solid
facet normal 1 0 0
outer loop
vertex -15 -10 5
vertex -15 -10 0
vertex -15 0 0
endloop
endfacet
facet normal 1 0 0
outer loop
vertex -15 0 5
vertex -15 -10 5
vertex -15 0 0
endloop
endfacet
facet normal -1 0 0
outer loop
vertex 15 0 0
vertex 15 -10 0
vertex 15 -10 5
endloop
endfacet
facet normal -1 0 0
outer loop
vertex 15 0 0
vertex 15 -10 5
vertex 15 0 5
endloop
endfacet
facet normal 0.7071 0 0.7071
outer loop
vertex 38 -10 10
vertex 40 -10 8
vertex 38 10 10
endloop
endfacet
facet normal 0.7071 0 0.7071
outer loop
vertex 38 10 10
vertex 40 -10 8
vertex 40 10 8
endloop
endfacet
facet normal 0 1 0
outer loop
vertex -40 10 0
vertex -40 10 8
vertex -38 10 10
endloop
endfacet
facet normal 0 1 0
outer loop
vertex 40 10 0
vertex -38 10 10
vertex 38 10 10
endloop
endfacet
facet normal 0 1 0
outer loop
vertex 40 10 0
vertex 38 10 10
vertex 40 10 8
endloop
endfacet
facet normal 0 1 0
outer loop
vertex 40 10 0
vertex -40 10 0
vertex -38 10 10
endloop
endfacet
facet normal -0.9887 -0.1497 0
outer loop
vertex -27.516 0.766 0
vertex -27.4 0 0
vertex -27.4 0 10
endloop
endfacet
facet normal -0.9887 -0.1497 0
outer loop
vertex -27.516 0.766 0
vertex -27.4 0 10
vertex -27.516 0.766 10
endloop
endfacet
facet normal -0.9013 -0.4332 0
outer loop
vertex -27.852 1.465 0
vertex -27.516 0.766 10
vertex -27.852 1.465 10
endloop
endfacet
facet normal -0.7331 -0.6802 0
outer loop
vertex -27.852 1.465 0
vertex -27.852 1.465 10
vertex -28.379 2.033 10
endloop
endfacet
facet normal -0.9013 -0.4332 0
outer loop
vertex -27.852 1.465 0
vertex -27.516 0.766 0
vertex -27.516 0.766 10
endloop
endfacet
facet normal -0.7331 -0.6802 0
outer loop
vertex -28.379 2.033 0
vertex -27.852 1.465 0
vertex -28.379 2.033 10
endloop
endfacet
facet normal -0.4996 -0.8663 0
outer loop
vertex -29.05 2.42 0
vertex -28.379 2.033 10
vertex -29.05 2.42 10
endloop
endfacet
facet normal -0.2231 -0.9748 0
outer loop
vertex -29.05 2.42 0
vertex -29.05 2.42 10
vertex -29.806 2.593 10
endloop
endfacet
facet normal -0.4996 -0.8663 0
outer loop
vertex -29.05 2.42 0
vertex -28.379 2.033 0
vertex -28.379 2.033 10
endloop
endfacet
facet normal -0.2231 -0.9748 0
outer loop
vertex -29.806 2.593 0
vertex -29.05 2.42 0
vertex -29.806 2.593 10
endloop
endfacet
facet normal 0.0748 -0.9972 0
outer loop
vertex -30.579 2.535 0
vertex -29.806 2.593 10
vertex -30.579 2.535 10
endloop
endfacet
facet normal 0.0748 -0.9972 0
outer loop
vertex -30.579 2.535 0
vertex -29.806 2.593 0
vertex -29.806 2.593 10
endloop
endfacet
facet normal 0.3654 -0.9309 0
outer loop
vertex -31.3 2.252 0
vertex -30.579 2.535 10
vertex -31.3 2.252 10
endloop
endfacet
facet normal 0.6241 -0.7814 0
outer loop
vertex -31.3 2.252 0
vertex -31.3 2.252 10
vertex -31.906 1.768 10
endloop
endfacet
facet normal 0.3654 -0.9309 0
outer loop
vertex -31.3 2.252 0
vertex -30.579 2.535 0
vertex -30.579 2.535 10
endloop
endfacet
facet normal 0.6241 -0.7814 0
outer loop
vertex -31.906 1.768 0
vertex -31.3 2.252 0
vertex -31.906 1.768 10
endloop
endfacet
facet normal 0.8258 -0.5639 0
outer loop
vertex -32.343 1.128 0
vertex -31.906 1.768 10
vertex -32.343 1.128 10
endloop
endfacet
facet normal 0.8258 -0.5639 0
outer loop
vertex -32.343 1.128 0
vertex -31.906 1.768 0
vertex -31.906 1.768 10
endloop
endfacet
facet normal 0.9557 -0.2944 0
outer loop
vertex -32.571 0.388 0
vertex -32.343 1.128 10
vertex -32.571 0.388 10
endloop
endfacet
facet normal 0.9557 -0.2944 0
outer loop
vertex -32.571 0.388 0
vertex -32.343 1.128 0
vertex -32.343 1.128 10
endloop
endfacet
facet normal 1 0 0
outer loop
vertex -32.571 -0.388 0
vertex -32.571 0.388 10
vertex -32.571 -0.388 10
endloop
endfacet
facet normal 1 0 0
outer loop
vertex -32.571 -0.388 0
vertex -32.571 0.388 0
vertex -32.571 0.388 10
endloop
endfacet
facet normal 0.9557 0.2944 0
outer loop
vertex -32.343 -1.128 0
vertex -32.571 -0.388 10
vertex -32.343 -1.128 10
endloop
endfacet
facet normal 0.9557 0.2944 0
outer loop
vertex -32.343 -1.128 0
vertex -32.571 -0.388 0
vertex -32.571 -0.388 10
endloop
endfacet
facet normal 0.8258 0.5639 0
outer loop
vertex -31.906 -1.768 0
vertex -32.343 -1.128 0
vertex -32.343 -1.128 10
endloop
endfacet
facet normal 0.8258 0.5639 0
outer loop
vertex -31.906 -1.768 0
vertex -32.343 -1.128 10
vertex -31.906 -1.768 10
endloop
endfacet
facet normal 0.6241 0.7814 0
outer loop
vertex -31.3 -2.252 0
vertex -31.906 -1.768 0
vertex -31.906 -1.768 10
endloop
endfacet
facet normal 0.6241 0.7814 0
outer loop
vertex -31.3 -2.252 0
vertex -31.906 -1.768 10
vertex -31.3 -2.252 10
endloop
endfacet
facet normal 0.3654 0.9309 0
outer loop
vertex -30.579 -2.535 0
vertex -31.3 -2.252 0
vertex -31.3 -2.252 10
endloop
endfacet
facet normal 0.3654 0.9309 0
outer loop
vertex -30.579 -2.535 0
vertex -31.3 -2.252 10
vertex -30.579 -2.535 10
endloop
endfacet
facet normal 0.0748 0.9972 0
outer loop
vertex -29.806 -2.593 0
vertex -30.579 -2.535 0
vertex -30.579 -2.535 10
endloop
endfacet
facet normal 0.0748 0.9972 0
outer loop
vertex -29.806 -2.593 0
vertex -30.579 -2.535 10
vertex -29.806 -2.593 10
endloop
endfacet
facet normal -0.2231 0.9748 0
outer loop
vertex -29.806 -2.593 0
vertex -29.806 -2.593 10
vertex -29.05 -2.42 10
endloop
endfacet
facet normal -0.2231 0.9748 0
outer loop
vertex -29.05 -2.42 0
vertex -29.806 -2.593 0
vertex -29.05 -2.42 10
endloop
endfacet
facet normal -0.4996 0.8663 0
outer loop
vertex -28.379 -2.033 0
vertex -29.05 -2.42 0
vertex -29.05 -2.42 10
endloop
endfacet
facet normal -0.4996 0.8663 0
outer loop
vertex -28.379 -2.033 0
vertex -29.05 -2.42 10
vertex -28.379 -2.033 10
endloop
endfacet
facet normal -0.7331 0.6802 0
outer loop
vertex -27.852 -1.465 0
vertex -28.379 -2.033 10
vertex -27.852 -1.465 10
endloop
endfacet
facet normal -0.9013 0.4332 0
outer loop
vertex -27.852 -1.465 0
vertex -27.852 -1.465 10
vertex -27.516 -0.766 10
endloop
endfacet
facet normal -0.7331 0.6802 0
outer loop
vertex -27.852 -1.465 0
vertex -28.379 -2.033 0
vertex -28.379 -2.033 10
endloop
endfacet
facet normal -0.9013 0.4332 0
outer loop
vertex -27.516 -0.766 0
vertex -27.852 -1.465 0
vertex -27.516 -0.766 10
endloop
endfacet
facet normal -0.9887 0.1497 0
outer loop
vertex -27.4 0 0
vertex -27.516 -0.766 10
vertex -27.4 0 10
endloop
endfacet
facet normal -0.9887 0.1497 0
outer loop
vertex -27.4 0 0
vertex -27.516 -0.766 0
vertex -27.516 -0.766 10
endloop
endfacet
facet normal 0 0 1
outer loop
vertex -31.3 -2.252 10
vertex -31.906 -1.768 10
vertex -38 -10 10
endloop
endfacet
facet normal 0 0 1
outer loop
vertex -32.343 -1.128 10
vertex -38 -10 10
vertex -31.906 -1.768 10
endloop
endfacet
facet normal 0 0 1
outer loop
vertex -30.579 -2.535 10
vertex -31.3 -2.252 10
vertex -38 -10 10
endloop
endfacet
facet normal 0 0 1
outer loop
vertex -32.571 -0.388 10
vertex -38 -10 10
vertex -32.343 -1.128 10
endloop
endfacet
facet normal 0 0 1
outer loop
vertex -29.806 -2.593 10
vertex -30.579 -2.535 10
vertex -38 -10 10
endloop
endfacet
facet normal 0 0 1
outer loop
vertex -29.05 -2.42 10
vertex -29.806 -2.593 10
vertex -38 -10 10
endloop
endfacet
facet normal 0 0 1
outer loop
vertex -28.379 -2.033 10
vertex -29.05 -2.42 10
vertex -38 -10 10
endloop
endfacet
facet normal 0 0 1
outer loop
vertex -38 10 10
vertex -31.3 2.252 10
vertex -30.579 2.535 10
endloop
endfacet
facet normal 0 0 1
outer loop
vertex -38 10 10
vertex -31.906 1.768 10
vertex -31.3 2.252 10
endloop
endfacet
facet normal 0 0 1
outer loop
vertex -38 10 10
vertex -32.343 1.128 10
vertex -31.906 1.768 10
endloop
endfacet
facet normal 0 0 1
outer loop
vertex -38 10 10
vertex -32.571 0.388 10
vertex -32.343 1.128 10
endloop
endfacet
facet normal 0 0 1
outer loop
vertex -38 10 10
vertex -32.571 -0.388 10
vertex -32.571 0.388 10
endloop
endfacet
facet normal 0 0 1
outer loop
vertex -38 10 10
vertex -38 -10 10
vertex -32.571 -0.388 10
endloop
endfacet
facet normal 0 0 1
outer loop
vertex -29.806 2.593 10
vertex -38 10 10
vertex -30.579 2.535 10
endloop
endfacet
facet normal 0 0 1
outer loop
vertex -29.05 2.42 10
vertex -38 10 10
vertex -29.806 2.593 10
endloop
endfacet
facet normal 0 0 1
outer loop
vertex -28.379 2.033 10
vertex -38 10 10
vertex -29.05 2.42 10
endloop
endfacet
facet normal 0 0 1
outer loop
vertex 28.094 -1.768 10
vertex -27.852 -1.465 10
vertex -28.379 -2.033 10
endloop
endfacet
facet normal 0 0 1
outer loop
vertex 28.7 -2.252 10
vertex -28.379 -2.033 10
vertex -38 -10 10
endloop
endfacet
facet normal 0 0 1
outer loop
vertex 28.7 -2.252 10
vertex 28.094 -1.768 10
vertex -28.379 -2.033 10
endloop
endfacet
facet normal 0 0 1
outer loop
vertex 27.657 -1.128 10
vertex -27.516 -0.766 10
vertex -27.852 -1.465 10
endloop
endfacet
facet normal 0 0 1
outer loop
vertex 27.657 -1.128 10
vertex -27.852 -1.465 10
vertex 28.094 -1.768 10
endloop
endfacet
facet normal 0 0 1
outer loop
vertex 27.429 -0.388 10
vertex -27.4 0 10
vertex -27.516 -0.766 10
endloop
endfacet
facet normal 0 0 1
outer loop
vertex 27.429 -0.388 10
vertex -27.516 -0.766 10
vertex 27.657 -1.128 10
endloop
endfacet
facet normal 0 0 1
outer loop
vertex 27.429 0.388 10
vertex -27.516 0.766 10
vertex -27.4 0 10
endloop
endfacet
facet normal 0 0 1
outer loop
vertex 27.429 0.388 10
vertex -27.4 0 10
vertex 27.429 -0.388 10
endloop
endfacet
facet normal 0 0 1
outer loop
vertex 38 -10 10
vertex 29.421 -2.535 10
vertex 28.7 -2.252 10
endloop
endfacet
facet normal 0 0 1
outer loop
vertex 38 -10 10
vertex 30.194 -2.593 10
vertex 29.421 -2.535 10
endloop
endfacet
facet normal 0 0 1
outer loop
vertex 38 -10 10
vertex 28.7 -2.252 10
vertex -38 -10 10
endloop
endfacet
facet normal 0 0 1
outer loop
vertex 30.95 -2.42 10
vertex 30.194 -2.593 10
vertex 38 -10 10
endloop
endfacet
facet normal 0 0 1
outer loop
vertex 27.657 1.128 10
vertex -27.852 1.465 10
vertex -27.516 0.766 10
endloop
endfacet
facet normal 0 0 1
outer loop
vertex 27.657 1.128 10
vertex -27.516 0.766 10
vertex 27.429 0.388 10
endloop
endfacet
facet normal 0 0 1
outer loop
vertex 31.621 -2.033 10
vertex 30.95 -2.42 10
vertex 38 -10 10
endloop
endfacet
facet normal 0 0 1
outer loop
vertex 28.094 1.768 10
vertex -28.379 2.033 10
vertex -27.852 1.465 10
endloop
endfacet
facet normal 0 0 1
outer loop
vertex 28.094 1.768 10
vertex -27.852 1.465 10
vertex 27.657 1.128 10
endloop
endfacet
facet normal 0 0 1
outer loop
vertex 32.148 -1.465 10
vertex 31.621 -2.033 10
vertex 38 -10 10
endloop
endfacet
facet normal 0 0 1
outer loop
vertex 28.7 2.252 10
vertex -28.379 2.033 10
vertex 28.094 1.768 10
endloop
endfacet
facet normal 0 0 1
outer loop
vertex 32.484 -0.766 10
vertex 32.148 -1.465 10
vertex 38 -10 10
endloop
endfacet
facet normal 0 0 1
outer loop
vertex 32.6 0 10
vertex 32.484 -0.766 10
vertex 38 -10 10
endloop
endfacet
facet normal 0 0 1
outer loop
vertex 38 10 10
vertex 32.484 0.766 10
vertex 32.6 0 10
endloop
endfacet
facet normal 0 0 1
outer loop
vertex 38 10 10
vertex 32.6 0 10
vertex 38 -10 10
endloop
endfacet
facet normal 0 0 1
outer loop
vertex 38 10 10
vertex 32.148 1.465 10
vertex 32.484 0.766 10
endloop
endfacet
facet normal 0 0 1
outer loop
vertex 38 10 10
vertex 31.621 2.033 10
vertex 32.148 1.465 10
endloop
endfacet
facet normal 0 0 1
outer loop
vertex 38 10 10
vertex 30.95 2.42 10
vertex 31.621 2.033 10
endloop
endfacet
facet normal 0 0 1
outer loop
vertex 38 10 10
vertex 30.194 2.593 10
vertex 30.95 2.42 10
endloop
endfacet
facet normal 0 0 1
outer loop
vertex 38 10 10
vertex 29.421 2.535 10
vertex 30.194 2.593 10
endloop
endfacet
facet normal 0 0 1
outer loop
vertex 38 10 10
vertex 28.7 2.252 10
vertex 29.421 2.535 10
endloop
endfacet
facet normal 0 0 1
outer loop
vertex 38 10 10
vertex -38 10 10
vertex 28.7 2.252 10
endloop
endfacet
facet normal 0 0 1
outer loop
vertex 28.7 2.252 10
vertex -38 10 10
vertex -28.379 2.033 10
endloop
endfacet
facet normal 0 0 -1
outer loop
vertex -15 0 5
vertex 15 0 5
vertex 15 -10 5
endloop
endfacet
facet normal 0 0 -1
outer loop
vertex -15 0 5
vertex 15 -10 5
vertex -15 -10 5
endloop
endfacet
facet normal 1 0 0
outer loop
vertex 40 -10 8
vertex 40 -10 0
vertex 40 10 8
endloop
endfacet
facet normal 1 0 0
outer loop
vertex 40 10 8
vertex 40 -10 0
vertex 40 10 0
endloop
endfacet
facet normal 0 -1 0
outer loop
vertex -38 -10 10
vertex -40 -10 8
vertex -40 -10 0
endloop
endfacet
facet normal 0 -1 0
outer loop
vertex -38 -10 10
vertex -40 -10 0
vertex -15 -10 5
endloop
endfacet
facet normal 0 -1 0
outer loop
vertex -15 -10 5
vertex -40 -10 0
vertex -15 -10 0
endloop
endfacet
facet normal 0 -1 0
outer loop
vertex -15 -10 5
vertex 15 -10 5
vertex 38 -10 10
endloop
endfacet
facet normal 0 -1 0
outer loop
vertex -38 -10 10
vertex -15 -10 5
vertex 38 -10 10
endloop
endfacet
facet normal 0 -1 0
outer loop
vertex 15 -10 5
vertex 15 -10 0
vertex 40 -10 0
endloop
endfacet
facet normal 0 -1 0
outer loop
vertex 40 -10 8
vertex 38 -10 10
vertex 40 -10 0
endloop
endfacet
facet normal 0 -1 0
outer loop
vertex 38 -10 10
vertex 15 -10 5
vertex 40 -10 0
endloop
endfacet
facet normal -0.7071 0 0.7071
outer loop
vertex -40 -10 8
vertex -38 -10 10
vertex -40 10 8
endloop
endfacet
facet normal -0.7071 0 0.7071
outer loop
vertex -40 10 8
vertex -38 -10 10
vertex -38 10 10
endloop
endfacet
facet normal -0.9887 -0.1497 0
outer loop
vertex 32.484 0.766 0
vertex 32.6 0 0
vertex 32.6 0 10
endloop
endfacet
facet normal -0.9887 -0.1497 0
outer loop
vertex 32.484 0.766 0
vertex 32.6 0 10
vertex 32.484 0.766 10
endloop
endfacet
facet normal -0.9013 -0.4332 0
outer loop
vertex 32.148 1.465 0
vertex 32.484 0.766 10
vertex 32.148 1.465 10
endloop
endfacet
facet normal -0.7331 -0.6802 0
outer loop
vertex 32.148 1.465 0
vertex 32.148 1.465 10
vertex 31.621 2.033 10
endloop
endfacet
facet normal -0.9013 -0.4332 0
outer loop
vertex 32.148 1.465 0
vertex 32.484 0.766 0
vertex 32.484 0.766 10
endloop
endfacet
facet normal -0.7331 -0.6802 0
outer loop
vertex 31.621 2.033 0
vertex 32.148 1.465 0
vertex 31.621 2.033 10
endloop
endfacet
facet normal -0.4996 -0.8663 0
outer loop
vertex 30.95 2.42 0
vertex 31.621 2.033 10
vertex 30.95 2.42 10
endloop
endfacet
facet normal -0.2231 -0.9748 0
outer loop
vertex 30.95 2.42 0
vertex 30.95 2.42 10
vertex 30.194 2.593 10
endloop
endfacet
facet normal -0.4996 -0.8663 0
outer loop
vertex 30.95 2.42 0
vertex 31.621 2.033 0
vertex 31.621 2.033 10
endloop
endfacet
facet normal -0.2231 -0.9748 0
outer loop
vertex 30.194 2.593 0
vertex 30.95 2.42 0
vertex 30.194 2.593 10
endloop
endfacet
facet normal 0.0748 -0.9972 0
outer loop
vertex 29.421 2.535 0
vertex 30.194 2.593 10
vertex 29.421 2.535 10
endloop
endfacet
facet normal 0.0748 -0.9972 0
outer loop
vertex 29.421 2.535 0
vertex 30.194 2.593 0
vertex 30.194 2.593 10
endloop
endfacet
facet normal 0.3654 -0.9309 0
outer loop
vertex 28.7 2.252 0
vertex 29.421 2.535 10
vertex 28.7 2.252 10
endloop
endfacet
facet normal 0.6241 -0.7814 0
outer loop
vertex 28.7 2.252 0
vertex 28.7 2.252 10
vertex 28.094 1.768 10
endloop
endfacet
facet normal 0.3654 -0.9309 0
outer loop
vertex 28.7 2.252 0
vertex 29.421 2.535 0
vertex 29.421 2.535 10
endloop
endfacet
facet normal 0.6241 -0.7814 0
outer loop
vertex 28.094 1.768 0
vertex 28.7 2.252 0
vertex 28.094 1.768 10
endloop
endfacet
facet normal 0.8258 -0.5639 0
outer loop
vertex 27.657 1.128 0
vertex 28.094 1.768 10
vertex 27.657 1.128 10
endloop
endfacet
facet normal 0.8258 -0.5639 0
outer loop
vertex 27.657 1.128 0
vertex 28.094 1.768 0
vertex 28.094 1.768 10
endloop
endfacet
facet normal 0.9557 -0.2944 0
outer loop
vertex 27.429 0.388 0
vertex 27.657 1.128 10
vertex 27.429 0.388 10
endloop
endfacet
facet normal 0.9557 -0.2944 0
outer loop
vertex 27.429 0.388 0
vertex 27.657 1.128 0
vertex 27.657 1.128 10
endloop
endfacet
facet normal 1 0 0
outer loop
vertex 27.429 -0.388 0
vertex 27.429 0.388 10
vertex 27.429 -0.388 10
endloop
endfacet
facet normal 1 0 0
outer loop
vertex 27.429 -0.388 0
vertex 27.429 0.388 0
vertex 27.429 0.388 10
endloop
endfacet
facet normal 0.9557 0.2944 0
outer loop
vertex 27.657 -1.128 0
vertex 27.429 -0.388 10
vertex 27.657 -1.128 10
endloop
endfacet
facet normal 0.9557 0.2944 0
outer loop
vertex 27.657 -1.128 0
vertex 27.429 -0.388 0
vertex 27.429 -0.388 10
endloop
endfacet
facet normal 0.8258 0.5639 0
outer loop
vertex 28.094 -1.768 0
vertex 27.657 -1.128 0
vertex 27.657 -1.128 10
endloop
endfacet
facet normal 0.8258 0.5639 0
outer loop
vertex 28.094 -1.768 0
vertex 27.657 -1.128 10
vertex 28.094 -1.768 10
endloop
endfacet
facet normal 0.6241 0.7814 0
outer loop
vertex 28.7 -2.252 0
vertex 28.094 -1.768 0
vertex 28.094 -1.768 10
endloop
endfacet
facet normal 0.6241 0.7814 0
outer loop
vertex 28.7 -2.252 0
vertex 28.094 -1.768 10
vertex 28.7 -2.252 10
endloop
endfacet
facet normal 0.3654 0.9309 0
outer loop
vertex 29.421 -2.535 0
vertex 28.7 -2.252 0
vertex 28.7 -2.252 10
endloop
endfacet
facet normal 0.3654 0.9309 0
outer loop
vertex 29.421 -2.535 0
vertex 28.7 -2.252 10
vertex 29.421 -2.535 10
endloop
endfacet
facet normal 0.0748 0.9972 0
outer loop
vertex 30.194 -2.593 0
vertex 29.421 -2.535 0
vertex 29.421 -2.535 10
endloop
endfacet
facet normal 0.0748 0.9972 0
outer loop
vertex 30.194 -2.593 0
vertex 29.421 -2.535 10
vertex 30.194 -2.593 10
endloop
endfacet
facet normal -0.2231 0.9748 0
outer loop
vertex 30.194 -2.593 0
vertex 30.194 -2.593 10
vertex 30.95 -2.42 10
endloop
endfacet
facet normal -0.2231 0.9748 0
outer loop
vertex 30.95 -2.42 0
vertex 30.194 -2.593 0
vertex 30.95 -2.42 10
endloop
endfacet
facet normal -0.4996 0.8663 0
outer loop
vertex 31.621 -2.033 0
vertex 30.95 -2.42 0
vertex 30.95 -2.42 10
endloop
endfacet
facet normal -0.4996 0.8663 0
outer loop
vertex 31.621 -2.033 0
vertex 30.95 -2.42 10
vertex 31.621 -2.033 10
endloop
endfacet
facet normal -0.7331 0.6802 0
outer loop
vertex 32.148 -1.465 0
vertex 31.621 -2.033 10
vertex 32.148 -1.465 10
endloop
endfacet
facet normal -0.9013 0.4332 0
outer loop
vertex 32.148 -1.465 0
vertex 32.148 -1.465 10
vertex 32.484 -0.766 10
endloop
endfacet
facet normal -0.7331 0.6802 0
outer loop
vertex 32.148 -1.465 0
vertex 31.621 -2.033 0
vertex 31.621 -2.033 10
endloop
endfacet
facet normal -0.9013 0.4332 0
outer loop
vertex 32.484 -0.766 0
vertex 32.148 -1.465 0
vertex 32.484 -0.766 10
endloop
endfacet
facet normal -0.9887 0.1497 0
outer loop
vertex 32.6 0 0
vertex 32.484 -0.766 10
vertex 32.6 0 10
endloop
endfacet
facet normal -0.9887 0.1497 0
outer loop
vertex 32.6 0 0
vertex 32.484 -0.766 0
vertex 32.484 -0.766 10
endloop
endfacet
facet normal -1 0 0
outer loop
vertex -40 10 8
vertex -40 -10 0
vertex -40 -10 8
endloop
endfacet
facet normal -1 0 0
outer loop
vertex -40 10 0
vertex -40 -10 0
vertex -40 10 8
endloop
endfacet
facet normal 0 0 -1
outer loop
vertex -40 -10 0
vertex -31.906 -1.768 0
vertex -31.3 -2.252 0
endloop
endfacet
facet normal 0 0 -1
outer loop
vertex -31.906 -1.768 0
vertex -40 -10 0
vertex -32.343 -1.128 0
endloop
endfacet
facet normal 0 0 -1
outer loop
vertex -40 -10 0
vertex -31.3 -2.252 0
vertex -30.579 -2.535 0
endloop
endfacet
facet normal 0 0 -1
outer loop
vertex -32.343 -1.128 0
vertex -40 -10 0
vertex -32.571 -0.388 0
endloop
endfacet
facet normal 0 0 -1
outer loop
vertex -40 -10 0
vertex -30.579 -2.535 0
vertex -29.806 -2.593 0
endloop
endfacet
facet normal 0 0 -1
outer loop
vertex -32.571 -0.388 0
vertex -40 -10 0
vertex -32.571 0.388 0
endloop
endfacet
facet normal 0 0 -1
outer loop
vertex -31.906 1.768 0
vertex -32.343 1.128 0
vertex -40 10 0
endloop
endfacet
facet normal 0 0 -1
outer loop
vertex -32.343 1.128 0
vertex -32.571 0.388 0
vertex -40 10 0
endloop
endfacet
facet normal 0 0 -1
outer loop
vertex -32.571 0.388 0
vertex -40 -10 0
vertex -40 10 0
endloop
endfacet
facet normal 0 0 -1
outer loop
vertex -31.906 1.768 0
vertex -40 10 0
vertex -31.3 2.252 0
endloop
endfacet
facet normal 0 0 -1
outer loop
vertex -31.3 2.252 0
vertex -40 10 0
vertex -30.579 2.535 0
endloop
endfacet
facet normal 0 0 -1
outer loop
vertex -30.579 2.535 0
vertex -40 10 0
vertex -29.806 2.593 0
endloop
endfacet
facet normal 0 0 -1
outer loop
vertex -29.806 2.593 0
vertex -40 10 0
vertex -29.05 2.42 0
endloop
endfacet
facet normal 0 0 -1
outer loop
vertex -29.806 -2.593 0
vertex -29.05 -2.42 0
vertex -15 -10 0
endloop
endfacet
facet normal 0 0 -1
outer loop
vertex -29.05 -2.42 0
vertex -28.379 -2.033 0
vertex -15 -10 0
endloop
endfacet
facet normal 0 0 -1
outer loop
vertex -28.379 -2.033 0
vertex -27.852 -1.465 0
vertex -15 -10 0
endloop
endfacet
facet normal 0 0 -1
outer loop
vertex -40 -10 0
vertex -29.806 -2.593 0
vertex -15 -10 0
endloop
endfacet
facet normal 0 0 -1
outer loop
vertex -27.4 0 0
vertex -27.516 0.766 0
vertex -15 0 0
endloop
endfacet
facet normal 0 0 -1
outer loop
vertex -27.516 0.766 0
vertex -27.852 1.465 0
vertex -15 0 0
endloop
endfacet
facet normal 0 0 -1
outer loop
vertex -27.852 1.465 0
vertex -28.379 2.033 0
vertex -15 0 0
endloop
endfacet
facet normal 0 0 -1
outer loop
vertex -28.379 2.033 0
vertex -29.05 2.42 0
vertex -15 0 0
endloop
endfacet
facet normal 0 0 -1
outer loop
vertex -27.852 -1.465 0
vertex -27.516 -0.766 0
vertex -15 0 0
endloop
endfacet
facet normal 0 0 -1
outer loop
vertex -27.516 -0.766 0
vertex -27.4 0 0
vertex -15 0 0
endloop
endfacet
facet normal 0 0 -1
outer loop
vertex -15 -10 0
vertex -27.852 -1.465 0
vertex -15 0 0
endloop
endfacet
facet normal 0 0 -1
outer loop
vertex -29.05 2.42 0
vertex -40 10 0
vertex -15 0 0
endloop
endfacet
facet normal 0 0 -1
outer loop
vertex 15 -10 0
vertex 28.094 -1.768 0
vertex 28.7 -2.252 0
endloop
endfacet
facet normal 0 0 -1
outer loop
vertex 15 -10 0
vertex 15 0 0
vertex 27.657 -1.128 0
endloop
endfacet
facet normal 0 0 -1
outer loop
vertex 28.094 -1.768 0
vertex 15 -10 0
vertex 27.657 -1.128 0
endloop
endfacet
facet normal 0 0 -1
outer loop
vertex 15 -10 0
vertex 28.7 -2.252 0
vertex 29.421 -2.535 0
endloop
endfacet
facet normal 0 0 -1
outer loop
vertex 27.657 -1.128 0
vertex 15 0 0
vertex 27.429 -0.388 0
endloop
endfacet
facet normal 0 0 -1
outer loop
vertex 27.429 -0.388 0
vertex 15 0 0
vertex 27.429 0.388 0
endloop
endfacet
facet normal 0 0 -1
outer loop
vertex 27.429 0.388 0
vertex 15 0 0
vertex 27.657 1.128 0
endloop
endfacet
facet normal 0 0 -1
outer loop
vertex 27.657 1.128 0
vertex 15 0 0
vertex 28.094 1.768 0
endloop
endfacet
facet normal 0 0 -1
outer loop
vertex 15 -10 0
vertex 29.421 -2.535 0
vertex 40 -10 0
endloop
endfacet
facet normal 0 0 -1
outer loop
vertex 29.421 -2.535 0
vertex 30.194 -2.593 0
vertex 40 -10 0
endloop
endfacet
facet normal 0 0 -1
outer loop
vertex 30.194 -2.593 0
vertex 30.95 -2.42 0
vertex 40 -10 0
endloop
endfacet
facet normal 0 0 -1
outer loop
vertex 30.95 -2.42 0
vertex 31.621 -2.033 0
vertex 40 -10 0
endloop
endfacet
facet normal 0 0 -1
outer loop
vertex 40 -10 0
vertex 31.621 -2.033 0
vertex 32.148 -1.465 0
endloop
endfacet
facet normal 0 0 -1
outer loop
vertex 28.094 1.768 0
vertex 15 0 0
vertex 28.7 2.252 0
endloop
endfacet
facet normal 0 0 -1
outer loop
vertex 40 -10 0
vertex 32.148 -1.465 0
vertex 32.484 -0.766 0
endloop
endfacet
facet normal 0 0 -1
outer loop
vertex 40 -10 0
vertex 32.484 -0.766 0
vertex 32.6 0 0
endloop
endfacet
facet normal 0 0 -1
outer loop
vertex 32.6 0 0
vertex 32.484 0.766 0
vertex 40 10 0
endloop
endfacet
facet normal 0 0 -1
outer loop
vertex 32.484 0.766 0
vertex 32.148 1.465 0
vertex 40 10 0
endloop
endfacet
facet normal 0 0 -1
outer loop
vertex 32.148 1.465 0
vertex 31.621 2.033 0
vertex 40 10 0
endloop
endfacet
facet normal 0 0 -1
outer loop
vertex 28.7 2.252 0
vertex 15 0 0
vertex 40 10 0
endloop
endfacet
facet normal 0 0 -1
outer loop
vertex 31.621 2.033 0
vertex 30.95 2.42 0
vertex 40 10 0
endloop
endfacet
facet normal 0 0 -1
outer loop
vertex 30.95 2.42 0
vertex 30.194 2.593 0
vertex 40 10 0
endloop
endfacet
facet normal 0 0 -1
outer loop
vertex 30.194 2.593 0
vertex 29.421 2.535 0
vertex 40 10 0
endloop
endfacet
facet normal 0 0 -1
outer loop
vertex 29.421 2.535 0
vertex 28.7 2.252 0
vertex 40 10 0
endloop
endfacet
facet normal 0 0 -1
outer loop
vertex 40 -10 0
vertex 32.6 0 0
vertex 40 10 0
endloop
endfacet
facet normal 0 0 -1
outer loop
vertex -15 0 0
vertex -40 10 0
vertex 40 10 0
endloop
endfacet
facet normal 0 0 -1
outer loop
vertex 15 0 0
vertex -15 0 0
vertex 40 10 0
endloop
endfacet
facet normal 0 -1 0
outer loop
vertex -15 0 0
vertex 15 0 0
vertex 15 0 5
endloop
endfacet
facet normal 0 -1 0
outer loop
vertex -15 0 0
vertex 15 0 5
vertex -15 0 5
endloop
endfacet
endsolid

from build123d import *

# Parameters (mm, degrees)
SKETCH_2_W          = 80
SKETCH_2_H          = 20
SKETCH_2_R          = 2.6
EXTRUDE_1_DEPTH     = 10
SKETCH_3_W          = 30
SKETCH_3_H          = 10
CUT_EXTRUDE_1_DEPTH = 5
CHAMFER_1_SIZE      = 2


with BuildPart() as part:
    # Эскиз2 → Бобышка-Вытянуть1 (new body)
    with BuildSketch(Plane.XY):
        Rectangle(SKETCH_2_W, SKETCH_2_H)
        with Locations((-30, 0)):
            Circle(SKETCH_2_R, mode=Mode.SUBTRACT)
        with Locations((30, 0)):
            Circle(SKETCH_2_R, mode=Mode.SUBTRACT)
    extrude(amount=EXTRUDE_1_DEPTH)

    # Эскиз3 → Вырез-Вытянуть1 (cut)
    with BuildSketch(Plane(origin=(0, 0, 0), x_dir=(-1, 0, 0), z_dir=(0, 0, -1))):
        with Locations((0, -5)):
            Rectangle(SKETCH_3_W, SKETCH_3_H)
    extrude(amount=-CUT_EXTRUDE_1_DEPTH, mode=Mode.SUBTRACT)

    # Фаска1
    chamfer_1_edges = [part.edges().sort_by_distance(p)[0] for p in [
        (-40, 0, 10),
        (40, 0, 10),
    ]]
    chamfer(chamfer_1_edges, length=CHAMFER_1_SIZE)


solid = part.part
